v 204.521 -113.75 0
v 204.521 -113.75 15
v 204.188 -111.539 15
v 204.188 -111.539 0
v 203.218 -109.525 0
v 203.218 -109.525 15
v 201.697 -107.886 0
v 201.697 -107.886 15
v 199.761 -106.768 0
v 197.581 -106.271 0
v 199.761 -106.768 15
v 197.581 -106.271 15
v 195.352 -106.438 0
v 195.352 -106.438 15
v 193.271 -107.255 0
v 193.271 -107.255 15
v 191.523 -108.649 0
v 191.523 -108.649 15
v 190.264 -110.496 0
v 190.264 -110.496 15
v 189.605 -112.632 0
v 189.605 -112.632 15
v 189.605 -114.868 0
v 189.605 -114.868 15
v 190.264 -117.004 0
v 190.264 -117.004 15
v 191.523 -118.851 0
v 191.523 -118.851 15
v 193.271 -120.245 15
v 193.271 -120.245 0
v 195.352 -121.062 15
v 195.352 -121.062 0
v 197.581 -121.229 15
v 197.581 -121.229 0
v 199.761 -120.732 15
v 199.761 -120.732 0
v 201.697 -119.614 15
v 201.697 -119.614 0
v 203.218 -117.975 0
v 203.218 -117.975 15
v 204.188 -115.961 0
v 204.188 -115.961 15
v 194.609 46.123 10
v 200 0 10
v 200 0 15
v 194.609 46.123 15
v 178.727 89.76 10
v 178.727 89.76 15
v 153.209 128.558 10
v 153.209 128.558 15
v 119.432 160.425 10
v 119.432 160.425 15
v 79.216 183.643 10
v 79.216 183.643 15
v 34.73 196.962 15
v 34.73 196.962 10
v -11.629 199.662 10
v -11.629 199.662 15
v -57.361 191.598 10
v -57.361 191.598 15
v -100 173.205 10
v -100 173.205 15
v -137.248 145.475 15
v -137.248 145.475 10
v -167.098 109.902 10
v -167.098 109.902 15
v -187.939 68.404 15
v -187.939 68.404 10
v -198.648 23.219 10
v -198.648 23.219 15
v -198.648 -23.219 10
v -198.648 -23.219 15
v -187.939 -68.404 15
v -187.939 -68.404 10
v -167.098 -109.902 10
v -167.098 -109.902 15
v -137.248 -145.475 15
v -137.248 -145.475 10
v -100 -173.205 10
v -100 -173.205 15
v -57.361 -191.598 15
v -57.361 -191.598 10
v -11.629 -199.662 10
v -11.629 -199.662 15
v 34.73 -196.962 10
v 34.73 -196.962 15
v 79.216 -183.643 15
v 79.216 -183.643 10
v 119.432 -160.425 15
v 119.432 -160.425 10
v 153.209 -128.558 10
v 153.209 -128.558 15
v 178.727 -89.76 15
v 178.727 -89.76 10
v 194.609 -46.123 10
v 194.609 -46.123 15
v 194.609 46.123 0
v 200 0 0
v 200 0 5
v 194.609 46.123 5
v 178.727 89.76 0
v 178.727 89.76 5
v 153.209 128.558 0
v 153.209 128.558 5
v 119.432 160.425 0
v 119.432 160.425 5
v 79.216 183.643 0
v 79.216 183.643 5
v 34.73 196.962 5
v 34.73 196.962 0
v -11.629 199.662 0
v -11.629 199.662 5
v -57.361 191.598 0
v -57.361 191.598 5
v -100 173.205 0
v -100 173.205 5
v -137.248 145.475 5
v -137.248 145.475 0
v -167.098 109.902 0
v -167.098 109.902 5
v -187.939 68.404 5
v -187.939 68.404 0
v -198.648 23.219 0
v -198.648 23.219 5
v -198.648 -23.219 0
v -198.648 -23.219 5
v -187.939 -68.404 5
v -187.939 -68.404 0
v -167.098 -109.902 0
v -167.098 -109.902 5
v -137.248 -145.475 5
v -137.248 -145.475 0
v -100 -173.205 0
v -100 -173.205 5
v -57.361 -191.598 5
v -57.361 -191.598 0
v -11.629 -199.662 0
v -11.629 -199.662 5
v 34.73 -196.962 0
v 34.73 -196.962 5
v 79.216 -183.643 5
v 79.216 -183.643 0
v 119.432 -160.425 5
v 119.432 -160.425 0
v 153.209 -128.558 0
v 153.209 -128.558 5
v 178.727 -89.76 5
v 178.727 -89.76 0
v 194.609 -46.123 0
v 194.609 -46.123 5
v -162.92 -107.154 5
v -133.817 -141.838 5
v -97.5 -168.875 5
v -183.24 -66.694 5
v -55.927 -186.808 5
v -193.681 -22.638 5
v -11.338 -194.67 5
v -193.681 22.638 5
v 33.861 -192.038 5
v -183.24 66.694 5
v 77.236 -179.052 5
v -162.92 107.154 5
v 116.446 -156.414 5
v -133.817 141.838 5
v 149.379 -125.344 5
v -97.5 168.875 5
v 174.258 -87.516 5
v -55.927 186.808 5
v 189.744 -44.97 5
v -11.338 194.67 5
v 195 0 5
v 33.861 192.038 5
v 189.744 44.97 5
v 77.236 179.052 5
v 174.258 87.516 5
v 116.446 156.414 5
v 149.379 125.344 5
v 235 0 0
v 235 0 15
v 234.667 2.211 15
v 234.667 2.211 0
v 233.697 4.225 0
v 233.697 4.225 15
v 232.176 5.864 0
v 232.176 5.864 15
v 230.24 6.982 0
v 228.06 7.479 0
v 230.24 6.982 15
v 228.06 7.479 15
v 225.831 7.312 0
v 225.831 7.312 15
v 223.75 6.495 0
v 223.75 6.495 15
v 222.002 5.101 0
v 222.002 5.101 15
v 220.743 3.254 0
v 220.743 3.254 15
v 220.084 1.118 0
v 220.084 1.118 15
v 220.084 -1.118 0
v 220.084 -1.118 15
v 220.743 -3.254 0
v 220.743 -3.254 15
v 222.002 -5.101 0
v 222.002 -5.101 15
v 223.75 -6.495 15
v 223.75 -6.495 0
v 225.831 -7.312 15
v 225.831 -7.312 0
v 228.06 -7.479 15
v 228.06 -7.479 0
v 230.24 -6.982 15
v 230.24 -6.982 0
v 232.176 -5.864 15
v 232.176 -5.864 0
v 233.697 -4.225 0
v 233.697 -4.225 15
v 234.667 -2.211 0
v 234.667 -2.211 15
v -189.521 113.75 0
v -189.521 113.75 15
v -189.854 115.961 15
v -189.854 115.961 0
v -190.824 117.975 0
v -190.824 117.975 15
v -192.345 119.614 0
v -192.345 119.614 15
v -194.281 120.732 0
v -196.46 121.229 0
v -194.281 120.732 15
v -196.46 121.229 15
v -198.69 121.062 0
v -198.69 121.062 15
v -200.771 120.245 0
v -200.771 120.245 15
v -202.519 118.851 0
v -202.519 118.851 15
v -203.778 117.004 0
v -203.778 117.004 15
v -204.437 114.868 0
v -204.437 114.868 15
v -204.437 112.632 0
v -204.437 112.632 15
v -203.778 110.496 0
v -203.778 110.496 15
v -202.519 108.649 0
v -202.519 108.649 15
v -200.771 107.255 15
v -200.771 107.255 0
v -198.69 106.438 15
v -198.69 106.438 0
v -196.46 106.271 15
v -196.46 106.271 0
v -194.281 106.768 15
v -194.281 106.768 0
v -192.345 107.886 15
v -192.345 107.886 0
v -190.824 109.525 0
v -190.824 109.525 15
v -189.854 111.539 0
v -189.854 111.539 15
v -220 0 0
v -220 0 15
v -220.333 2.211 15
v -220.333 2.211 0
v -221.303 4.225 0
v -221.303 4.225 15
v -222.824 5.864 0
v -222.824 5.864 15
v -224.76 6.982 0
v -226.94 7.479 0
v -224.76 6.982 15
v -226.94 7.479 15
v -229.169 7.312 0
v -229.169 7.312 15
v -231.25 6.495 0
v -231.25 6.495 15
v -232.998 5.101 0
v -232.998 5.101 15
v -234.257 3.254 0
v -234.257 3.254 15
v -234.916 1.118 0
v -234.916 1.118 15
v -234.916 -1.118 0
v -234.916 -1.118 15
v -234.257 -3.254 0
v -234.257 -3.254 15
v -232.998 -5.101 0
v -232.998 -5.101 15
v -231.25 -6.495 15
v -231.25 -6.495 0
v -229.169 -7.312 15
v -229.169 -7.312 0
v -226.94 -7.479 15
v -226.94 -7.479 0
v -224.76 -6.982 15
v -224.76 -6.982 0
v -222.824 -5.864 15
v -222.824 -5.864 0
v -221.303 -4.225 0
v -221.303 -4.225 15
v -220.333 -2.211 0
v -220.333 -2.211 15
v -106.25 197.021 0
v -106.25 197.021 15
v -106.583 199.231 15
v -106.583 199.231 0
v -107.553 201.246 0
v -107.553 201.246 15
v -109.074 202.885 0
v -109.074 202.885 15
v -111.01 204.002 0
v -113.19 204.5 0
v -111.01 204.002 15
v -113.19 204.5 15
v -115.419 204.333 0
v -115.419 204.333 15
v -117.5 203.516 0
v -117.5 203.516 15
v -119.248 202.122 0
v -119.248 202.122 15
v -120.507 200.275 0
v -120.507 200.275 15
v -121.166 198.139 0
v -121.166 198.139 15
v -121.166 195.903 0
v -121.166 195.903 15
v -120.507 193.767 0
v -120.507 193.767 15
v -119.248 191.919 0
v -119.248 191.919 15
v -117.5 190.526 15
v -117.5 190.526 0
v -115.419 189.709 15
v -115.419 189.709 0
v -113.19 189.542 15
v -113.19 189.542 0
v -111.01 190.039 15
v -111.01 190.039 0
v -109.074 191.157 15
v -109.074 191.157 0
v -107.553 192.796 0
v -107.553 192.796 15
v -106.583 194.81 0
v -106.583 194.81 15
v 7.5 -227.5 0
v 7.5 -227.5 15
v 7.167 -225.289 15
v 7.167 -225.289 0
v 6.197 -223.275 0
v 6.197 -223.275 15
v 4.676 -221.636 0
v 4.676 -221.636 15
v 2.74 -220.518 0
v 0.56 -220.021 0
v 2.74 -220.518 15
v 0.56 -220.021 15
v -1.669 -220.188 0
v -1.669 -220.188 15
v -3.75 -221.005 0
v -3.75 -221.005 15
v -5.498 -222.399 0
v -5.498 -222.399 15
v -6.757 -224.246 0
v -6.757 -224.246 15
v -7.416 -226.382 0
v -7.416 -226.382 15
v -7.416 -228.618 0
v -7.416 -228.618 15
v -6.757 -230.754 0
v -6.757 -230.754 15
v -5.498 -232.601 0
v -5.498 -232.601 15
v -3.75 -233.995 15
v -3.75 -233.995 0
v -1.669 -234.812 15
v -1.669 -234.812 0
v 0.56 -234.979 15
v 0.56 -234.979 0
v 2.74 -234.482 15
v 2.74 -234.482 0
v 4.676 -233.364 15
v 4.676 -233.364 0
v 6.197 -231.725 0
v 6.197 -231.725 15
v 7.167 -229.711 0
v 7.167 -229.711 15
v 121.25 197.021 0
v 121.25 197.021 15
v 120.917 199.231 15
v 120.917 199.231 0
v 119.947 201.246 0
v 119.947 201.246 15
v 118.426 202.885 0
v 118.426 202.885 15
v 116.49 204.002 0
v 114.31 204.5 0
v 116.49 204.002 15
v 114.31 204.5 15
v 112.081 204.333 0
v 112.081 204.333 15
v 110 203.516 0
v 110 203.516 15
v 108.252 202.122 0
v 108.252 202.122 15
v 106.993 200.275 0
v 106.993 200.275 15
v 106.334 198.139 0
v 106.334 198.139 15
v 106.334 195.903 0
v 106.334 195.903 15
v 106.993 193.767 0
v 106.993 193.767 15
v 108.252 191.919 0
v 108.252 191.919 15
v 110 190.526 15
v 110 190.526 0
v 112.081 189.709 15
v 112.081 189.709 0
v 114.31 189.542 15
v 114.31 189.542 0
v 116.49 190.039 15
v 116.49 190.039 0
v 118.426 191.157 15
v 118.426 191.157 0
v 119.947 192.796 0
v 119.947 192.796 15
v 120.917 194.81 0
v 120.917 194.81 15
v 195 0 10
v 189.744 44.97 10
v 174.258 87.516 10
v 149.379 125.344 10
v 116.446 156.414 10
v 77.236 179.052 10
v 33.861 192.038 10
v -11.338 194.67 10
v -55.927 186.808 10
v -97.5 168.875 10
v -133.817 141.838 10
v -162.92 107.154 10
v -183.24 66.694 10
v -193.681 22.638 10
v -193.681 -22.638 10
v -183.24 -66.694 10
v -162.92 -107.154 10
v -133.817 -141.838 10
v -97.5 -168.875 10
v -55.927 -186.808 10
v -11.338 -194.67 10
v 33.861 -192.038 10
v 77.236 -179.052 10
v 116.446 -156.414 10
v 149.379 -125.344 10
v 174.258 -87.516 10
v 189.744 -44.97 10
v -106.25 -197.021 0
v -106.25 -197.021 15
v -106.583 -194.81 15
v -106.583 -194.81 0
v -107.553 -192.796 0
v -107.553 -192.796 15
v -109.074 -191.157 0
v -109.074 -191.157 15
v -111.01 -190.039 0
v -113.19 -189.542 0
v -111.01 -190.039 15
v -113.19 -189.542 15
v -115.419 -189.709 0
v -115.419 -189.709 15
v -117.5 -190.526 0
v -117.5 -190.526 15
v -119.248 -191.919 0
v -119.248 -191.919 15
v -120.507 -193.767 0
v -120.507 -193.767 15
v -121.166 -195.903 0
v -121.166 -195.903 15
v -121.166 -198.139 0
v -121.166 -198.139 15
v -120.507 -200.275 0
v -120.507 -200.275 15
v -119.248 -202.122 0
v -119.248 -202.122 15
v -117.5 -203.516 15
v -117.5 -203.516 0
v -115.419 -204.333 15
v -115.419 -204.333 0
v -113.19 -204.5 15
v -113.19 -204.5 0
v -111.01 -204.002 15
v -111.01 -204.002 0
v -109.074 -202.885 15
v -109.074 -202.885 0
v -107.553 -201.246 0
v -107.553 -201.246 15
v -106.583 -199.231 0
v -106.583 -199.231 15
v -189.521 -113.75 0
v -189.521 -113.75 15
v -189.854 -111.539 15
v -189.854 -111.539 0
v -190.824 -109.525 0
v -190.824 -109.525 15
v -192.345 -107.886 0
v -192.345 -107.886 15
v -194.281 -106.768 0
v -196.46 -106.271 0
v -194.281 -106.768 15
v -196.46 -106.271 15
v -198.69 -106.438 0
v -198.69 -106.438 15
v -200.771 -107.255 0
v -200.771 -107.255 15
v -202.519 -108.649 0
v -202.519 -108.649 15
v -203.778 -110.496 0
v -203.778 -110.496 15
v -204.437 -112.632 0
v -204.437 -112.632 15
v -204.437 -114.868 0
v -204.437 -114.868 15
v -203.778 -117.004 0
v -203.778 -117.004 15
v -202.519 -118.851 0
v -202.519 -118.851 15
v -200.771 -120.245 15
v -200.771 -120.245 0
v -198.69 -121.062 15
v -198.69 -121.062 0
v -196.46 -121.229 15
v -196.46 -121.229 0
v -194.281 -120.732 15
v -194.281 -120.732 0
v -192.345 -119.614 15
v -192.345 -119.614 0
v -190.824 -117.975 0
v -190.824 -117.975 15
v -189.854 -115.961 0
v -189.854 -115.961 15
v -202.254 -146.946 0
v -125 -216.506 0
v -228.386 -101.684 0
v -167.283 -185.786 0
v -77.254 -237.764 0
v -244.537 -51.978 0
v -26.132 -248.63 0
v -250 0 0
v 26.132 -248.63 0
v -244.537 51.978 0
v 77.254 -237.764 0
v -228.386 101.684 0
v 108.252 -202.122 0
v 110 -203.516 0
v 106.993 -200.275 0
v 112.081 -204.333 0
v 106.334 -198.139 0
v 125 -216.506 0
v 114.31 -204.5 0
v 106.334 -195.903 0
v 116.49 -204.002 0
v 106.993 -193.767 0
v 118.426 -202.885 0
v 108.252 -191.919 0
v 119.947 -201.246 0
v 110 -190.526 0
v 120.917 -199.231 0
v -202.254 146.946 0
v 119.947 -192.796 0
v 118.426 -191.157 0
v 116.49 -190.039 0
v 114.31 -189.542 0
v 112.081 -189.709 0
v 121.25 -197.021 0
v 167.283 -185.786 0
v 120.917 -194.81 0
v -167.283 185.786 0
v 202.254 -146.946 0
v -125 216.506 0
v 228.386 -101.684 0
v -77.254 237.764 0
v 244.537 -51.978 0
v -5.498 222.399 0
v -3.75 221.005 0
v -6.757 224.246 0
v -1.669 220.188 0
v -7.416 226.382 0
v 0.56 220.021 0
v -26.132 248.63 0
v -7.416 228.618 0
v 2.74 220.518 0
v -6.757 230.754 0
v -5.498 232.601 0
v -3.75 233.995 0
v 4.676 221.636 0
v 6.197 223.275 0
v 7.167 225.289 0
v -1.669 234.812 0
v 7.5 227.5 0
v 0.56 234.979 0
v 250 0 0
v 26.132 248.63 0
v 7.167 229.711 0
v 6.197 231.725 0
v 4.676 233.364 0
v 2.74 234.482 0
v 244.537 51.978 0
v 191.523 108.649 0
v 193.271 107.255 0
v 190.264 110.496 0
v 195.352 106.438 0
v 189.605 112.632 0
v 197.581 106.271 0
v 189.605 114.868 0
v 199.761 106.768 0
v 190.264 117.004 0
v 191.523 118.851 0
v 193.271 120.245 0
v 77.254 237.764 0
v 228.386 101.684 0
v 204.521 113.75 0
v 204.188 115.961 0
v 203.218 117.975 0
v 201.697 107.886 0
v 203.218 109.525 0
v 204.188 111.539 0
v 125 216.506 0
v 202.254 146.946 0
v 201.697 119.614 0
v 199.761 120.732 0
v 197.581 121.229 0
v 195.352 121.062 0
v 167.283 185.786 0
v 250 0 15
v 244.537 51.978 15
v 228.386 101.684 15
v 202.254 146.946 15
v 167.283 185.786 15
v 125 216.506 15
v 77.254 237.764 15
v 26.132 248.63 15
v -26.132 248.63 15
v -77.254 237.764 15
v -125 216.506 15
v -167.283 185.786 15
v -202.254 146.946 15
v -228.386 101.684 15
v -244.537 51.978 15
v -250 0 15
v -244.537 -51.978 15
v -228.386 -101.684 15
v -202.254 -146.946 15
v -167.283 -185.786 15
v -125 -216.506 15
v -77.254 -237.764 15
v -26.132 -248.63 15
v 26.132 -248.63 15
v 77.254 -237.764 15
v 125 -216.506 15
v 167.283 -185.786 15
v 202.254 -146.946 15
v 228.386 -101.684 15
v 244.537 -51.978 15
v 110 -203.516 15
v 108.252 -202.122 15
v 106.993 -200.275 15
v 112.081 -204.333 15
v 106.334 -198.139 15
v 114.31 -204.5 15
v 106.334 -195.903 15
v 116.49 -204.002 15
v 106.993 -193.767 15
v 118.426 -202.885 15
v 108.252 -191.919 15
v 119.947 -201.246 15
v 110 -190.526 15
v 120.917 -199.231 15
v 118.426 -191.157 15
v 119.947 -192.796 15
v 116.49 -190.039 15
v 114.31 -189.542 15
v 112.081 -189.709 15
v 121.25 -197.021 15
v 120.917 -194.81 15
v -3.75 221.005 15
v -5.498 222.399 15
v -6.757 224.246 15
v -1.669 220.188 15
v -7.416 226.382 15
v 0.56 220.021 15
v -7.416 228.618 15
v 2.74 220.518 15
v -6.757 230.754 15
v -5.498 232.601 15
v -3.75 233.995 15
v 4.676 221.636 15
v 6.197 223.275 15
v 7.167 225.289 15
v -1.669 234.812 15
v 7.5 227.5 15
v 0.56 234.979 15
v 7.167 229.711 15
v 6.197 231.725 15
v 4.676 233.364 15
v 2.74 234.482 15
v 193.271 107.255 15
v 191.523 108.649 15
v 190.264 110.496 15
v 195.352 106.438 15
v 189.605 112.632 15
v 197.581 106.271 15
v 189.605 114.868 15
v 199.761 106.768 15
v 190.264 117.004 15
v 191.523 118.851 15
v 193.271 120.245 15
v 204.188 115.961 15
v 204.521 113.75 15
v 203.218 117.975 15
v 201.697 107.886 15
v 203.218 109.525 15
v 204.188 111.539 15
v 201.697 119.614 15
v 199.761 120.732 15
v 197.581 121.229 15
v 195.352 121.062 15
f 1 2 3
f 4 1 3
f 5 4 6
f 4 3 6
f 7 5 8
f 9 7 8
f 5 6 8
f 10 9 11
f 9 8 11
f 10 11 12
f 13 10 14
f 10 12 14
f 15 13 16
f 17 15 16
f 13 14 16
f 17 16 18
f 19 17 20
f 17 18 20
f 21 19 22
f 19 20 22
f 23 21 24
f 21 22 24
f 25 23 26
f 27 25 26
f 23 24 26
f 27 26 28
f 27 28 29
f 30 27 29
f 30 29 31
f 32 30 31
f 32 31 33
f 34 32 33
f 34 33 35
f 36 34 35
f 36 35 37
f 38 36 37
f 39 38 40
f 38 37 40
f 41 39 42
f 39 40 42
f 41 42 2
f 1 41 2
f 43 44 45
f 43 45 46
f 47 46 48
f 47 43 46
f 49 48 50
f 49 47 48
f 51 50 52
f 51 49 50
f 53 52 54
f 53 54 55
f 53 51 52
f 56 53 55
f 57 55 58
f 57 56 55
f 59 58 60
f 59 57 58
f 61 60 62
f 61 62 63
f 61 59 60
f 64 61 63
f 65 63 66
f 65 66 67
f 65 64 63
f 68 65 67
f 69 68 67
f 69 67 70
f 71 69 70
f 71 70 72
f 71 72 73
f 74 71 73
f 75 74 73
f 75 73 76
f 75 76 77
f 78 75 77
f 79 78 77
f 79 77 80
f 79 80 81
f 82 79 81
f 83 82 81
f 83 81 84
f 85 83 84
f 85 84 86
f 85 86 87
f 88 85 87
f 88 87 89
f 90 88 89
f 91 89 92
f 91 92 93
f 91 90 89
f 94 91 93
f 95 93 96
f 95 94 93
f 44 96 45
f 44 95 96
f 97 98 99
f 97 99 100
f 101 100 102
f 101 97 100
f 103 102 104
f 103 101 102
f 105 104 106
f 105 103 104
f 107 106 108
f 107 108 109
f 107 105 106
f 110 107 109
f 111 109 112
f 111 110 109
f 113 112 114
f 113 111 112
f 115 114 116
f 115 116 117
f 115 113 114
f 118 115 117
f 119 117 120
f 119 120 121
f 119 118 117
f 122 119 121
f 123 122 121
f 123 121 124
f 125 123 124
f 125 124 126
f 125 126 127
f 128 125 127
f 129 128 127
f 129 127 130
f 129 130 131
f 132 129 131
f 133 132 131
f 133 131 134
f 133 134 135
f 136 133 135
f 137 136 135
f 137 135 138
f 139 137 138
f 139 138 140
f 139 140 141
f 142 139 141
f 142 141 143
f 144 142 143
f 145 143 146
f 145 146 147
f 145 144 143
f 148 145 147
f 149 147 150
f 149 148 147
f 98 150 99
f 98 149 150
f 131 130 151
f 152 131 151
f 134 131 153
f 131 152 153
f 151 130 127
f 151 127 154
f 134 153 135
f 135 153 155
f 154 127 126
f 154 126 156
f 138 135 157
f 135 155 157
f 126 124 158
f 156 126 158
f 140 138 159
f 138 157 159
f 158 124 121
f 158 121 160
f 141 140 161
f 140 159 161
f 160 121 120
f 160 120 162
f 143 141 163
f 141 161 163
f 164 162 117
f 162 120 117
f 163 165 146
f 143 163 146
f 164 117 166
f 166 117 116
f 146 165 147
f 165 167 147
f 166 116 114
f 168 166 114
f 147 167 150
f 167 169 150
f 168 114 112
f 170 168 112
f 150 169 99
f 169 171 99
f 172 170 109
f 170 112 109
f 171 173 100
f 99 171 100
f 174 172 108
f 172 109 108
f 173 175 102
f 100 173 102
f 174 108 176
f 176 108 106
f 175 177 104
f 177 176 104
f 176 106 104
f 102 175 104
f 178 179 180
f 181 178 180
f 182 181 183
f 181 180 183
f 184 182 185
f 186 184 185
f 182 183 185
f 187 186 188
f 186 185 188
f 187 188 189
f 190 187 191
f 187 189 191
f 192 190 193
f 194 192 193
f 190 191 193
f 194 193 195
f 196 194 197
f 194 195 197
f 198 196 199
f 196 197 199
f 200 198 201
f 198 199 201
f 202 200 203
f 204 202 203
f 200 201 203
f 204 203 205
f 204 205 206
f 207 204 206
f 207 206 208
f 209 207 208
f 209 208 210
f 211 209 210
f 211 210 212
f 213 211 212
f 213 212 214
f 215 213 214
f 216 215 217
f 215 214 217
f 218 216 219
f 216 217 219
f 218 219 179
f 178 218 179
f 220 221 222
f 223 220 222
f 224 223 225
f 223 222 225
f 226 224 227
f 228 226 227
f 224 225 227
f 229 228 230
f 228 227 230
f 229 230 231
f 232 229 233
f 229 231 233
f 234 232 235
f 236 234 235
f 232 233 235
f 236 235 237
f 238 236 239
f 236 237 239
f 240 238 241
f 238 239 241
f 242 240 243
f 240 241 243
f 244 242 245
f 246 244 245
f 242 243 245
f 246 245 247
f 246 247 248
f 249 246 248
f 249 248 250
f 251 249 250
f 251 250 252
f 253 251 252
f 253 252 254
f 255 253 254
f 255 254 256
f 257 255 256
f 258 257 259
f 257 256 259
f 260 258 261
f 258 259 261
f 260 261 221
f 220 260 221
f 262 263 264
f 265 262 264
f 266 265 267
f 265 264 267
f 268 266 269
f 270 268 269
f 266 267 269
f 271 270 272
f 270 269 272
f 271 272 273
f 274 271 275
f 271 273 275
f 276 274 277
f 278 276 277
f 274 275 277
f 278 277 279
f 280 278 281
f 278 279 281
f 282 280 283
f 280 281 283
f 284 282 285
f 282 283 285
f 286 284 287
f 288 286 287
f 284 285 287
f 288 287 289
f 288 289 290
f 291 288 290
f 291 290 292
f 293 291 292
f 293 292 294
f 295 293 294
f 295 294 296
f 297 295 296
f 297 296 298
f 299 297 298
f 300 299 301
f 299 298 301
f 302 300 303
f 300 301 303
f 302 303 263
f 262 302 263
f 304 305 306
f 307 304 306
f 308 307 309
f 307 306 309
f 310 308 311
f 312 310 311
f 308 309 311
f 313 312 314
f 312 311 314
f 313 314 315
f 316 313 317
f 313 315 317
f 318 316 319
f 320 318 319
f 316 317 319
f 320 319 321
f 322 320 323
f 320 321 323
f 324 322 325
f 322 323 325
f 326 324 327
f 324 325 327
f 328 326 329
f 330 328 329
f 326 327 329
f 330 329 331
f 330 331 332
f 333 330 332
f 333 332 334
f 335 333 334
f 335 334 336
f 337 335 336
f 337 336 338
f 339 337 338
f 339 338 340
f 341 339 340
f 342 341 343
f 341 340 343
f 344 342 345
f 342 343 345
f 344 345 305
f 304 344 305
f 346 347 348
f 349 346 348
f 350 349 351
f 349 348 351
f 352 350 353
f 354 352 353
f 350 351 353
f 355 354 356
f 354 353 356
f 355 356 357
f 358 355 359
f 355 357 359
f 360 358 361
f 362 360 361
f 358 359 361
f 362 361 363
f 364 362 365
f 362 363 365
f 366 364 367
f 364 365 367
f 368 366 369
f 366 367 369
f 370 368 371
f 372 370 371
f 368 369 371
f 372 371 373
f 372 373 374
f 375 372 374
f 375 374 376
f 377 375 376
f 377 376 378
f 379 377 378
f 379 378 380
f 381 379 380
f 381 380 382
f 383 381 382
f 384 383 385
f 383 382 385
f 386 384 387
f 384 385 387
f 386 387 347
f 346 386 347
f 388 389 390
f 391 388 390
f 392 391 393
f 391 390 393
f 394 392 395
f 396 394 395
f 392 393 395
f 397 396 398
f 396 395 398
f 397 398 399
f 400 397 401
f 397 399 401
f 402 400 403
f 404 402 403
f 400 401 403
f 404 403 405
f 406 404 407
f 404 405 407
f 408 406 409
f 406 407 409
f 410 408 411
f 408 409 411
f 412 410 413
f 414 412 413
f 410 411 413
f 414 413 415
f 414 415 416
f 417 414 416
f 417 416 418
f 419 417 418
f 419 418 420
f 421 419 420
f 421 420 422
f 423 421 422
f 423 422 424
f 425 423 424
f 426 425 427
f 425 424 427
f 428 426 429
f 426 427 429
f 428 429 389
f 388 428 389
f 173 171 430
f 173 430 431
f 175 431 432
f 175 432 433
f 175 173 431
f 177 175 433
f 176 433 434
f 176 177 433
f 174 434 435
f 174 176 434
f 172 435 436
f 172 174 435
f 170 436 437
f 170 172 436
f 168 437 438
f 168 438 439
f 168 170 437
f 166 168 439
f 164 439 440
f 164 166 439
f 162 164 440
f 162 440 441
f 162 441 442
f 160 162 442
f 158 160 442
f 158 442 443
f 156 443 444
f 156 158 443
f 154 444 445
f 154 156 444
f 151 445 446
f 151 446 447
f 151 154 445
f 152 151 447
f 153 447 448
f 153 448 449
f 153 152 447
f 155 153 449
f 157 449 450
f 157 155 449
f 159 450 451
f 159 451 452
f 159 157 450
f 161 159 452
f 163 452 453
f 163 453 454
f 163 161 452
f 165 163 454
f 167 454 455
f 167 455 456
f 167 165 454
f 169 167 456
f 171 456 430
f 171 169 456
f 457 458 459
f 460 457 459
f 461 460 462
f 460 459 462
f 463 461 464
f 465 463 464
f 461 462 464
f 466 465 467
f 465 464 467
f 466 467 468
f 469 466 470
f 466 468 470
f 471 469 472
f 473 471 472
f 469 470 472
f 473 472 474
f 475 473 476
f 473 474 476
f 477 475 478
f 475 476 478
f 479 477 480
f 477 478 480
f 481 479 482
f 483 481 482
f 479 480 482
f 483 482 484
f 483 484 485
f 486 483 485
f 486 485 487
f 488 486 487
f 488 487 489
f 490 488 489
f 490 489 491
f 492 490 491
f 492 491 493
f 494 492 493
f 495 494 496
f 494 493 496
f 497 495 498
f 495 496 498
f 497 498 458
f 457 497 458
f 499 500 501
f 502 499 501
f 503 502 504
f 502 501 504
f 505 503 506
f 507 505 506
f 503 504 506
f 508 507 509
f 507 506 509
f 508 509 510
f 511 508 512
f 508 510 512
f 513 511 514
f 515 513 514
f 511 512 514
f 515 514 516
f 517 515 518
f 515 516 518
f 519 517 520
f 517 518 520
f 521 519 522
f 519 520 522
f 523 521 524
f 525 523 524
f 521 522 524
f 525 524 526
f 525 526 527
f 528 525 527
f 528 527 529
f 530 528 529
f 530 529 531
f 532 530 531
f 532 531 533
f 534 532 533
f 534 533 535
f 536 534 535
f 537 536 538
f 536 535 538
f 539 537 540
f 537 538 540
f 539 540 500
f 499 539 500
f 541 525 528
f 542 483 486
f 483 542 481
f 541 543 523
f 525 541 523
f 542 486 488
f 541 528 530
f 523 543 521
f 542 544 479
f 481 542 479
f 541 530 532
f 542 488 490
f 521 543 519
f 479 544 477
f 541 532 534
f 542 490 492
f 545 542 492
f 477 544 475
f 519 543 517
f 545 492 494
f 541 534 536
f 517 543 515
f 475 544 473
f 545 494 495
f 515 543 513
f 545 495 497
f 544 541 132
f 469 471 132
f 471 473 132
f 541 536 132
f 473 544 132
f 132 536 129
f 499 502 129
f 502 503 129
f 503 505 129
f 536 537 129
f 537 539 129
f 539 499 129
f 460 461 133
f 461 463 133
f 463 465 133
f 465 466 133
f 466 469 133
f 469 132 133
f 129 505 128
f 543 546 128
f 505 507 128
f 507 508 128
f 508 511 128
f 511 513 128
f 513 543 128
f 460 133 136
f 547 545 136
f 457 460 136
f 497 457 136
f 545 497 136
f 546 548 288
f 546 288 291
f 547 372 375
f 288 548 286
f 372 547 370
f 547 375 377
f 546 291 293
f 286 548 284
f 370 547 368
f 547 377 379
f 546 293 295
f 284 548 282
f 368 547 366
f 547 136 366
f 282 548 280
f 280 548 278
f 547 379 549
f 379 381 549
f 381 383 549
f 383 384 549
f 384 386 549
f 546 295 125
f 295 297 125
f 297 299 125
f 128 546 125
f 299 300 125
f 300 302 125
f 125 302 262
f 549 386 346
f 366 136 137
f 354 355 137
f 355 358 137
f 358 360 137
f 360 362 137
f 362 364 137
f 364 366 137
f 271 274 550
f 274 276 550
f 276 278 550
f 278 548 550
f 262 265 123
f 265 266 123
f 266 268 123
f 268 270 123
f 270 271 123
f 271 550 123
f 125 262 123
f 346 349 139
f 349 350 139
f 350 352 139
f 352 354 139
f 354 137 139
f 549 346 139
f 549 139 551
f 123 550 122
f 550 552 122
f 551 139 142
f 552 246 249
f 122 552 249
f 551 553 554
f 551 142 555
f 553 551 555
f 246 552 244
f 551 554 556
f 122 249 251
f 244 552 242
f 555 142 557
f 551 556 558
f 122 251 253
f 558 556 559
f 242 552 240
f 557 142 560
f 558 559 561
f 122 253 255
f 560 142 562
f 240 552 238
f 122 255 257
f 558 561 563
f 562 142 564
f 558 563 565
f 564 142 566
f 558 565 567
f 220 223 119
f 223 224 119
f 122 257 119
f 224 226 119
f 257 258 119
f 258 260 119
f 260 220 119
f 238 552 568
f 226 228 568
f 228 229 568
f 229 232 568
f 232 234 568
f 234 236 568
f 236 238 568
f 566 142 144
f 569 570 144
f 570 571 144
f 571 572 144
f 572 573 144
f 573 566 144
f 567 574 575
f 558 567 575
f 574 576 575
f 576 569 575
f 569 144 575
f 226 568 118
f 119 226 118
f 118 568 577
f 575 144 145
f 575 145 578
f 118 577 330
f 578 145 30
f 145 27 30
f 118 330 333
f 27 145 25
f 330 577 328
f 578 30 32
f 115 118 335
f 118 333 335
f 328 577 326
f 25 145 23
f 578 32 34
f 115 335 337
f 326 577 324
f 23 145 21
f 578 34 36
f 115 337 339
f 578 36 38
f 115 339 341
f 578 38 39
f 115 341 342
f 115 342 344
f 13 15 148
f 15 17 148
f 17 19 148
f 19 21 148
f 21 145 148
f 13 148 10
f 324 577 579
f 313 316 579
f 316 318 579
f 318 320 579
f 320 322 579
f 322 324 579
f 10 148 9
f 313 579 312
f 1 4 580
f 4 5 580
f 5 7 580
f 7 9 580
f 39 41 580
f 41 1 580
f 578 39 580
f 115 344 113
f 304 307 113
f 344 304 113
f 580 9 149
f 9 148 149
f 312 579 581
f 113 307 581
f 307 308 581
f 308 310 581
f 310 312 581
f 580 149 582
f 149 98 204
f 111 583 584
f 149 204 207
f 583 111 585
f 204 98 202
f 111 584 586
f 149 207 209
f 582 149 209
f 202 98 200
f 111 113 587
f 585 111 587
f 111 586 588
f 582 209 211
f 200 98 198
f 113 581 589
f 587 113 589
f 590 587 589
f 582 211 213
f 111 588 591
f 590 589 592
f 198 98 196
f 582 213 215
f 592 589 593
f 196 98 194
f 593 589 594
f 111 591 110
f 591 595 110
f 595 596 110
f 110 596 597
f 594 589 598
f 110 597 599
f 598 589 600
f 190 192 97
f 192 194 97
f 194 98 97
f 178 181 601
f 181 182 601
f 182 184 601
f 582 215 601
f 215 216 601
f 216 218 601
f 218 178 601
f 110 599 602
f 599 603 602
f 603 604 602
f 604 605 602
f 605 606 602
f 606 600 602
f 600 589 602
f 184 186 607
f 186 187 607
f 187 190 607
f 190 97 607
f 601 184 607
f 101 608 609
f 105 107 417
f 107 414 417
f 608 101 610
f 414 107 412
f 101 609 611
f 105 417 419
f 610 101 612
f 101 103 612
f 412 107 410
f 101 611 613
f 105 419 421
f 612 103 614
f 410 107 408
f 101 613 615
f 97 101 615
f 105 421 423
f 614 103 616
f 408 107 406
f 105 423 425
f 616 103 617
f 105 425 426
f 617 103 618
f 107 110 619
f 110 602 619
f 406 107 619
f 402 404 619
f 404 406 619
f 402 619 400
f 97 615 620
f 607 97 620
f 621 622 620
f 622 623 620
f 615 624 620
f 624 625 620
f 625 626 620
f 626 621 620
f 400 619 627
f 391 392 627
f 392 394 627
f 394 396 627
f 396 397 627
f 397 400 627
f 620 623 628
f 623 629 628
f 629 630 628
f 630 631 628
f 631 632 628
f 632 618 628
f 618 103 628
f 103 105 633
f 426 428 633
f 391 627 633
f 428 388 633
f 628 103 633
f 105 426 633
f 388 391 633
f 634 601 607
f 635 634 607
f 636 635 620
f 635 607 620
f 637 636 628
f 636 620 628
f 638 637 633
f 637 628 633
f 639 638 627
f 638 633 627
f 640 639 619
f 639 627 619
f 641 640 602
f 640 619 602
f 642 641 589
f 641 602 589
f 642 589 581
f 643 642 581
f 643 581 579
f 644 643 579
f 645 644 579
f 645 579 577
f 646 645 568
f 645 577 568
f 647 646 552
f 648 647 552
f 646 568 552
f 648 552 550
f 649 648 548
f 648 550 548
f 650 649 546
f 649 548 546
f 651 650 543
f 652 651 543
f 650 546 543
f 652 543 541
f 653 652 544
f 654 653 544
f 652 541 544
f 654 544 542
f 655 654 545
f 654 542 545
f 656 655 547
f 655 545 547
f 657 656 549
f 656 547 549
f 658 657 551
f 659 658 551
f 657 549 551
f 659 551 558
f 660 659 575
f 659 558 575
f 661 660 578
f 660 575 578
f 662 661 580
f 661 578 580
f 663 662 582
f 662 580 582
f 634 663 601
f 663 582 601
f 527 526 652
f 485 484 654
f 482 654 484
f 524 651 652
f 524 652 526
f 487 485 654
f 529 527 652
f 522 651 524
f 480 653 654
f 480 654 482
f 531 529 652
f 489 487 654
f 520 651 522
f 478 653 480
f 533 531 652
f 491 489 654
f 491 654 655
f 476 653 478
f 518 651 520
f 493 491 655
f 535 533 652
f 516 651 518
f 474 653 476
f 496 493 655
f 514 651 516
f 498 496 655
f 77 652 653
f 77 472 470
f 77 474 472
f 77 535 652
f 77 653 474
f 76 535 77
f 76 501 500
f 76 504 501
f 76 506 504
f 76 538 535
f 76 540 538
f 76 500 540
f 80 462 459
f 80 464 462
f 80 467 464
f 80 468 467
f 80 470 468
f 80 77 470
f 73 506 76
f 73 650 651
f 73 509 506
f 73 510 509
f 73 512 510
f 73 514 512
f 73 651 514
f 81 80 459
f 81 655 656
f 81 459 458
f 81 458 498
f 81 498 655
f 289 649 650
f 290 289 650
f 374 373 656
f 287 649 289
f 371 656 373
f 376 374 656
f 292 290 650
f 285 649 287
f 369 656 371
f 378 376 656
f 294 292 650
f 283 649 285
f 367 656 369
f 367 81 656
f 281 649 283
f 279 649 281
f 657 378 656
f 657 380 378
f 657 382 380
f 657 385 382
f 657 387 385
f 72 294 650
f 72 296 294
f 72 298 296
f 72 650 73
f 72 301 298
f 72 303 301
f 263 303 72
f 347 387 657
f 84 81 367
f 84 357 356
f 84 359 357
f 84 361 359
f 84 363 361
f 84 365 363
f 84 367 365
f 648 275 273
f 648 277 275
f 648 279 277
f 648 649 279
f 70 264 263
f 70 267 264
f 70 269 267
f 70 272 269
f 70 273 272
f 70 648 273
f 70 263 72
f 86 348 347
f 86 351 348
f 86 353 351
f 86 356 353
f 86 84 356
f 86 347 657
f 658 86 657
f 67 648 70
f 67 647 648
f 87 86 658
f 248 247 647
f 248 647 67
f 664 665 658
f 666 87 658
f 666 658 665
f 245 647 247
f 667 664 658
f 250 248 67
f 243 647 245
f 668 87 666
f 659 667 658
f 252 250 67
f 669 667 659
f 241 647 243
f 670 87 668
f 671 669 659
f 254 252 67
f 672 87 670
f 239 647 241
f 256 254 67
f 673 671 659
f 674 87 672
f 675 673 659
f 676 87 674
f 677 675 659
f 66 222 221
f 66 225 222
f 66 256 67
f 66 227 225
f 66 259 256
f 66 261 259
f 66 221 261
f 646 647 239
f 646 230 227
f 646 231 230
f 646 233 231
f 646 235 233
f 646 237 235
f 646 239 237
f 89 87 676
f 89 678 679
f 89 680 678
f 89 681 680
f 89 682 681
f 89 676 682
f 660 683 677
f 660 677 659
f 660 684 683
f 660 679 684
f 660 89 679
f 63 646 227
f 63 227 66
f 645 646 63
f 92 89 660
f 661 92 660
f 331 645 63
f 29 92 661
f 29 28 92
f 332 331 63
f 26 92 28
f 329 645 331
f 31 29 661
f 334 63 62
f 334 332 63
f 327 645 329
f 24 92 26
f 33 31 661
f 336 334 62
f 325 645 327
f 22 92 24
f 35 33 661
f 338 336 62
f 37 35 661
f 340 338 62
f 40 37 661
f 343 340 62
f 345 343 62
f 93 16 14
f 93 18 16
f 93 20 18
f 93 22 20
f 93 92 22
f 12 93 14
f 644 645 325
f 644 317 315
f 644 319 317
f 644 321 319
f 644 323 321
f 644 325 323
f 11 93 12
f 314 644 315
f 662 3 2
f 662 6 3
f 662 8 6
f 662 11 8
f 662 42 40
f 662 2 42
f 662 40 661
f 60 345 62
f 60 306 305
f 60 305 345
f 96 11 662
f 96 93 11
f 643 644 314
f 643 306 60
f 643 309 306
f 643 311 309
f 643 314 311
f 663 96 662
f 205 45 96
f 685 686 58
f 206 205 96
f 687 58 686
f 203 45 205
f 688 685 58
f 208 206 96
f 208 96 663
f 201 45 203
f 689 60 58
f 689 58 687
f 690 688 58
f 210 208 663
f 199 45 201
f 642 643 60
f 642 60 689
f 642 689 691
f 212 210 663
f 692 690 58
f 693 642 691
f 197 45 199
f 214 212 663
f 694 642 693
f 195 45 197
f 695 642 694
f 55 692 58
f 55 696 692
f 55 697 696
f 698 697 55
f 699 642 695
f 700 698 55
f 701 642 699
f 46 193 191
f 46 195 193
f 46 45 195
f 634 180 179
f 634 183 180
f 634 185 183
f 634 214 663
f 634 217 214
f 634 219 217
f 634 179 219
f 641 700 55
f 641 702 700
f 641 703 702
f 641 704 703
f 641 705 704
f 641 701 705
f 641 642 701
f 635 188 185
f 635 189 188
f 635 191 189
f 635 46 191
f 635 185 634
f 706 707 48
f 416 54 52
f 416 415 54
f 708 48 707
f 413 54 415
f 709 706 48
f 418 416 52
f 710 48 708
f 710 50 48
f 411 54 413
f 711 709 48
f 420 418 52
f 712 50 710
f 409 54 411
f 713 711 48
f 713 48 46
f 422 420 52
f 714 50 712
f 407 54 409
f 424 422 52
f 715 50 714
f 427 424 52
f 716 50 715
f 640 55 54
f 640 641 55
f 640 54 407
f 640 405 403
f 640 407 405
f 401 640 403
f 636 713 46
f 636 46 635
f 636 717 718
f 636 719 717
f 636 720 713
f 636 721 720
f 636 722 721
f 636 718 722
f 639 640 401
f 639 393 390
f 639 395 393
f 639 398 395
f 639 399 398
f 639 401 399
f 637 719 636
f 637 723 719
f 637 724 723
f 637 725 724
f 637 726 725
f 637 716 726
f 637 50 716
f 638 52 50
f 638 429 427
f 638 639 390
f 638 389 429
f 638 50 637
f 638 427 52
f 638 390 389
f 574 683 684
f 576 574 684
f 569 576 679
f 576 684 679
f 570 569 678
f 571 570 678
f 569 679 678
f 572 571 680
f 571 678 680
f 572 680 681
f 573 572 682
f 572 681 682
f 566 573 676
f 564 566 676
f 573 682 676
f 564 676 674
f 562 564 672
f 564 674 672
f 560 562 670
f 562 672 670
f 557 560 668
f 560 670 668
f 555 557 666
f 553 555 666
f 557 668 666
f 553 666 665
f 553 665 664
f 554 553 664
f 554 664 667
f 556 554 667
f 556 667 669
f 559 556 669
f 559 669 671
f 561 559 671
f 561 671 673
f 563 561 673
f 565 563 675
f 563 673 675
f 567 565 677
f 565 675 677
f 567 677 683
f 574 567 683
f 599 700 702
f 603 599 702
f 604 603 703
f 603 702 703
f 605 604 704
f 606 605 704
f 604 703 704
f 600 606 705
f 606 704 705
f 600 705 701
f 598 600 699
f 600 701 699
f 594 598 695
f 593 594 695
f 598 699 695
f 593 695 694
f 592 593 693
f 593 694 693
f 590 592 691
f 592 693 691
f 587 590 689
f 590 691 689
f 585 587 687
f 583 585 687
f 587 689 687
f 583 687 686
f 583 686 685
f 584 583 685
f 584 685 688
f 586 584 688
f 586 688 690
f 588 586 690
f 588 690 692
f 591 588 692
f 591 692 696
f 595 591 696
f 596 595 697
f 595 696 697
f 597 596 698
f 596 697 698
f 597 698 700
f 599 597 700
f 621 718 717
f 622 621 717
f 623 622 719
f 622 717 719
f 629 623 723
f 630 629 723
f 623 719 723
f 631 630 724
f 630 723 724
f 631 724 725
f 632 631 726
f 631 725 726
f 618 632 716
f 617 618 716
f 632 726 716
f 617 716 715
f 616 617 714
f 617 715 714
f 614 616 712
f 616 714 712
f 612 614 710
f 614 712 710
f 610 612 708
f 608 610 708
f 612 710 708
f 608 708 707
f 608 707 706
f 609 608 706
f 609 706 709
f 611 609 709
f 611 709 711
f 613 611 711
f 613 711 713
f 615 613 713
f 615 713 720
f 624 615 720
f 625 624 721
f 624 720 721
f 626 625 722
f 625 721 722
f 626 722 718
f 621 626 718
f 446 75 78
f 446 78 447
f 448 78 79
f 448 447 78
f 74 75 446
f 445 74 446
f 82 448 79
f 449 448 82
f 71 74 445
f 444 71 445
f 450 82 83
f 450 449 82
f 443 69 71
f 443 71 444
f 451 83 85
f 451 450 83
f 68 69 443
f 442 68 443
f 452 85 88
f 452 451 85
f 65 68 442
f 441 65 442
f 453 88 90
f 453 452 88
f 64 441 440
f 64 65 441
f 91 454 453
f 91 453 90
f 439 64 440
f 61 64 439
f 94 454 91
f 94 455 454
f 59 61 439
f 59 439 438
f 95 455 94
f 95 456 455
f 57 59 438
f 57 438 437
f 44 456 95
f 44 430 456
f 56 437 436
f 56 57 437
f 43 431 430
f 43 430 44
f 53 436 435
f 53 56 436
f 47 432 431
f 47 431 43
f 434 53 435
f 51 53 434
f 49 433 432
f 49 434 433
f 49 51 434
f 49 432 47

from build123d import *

# Parameters (mm, degrees)
F0_R     = 250
F0_R_2   = 200
F1_DEPTH = 15
F2_R     = 7.5
F3_DEPTH = 15
F5_R     = 200
F5_R_2   = 195
F6_DEPTH = 5


with BuildPart() as f1:
    # F0 (on Top) → F1 (new body)
    with BuildSketch(Plane.XY):
        Circle(F0_R)
        Circle(F0_R_2, mode=Mode.SUBTRACT)
    extrude(amount=F1_DEPTH)

    # F2 (on face) → F3 (cut, through all)
    with BuildSketch(Plane.XY.offset(15)):
        with Locations((227.5, 0)):
            Circle(F2_R)
        with Locations((197.020779, 113.75)):
            Circle(F2_R)
        with Locations((113.75, 197.020779)):
            Circle(F2_R)
        with Locations((0, 227.5)):
            Circle(F2_R)
        with Locations((-113.75, 197.020779)):
            Circle(F2_R)
        with Locations((-197.020779, 113.75)):
            Circle(F2_R)
        with Locations((-227.5, 0)):
            Circle(F2_R)
        with Locations((-197.020779, -113.75)):
            Circle(F2_R)
        with Locations((-113.75, -197.020779)):
            Circle(F2_R)
        with Locations((0, -227.5)):
            Circle(F2_R)
        with Locations((113.75, -197.020779)):
            Circle(F2_R)
        with Locations((197.020779, -113.75)):
            Circle(F2_R)
    extrude(amount=-F3_DEPTH, mode=Mode.SUBTRACT)

    # F5 (on offset) → F6 (join)
    with BuildSketch(Plane.XY.offset(5)):
        Circle(F5_R)
        Circle(F5_R_2, mode=Mode.SUBTRACT)
    extrude(amount=F6_DEPTH)


solid = f1.part
